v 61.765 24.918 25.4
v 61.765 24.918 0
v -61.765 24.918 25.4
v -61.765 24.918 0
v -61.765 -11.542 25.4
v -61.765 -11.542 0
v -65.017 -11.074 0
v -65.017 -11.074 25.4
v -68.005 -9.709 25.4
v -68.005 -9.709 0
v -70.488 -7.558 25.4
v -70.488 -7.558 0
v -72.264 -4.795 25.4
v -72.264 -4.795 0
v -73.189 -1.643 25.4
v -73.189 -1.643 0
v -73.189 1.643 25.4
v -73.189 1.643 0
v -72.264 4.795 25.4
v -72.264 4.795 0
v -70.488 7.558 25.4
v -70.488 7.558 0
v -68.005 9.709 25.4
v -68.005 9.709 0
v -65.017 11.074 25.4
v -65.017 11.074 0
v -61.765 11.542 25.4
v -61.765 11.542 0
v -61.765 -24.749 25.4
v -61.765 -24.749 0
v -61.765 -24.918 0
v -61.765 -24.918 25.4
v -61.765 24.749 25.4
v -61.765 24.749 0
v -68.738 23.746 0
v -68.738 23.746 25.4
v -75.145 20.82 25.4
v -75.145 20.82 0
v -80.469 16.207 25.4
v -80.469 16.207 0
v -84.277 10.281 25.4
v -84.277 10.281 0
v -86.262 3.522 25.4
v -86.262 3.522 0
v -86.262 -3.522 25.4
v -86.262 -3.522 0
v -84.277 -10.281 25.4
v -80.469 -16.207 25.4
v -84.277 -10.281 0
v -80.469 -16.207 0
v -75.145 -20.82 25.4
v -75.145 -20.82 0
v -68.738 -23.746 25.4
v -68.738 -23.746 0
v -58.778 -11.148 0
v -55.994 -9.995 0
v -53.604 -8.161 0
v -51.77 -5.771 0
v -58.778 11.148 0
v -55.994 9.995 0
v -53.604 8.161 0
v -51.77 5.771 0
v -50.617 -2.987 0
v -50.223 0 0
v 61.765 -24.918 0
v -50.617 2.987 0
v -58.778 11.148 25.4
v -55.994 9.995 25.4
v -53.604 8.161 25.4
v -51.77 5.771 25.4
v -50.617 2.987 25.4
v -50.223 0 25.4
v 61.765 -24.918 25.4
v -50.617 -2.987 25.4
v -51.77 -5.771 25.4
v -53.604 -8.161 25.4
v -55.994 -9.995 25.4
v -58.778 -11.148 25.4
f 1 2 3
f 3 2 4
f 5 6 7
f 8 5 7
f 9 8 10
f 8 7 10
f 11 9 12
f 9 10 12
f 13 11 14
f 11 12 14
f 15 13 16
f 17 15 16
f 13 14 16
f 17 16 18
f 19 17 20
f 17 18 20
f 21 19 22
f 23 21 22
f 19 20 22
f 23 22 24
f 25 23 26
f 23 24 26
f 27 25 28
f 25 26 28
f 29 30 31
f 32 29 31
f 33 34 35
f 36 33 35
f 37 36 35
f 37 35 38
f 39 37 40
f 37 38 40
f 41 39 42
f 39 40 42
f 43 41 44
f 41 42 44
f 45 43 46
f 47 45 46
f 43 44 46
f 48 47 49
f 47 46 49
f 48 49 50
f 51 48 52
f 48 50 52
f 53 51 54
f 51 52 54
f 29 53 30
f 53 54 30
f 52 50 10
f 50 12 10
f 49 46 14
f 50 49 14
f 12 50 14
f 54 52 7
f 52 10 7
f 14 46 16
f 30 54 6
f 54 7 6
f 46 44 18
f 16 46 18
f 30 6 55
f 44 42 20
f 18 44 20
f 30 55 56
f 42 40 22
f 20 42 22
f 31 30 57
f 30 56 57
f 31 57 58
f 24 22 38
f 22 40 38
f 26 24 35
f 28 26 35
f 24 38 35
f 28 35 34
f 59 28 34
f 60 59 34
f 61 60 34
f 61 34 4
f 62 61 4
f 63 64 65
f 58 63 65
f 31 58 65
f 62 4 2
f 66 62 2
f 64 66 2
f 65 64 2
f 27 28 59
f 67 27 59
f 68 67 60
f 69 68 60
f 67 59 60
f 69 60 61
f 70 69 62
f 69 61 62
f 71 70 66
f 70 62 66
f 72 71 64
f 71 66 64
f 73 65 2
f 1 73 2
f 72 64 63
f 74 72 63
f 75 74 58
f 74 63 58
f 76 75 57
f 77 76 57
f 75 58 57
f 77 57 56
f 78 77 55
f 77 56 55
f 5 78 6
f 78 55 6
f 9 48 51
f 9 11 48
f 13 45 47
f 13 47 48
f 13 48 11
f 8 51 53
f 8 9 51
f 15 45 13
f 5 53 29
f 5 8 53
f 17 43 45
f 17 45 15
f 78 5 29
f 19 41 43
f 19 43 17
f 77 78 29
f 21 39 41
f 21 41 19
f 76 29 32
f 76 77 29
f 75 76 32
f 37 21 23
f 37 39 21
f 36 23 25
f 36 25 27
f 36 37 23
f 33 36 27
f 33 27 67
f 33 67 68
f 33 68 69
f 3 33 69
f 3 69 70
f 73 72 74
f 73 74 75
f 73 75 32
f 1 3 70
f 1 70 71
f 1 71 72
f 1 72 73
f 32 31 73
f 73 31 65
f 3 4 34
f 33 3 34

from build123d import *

# Parameters (mm, degrees)
F1_DEPTH = 25.4


with BuildPart() as f1:
    # F0 (on Top) → F1 (new body)
    with BuildSketch(Plane.XY):
        with BuildLine():
            Line((-61.765037477, -24.7485272537), (-61.765037477, -24.9177198857))
            Line((-61.765037477, -24.9177198857), (61.765037477, -24.9177198857))
            Line((61.765037477, -24.9177198857), (61.765037477, 24.9177198857))
            Line((61.765037477, 24.9177198857), (-61.765037477, 24.9177198857))
            Line((-61.765037477, 24.9177198857), (-61.765037477, 24.7485272537))
            ThreePointArc((-61.765037477, 24.7485272537), (-44.2651860316, 17.4998514455), (-37.0165102233, 0))
            ThreePointArc((-37.0165102233, 0), (-44.2651860316, -17.4998514455), (-61.765037477, -24.7485272537))
        make_face()
        with BuildLine():
            ThreePointArc((-61.765037477, 24.7485272537), (-86.5135647307, 0), (-61.765037477, -24.7485272537))
            Line((-61.765037477, -24.7485272537), (-61.765037477, -11.5415442381))
            ThreePointArc((-61.765037477, -11.5415442381), (-73.3065817151, 0), (-61.765037477, 11.5415442381))
            Line((-61.765037477, 11.5415442381), (-61.765037477, 24.7485272537))
        make_face()
        with BuildLine():
            Line((-61.765037477, -11.5415442381), (-61.765037477, -24.7485272537))
            ThreePointArc((-61.765037477, -24.7485272537), (-44.2651860316, -17.4998514455), (-37.0165102233, 0))
            ThreePointArc((-37.0165102233, 0), (-44.2651860316, 17.4998514455), (-61.765037477, 24.7485272537))
            Line((-61.765037477, 24.7485272537), (-61.765037477, 11.5415442381))
            ThreePointArc((-61.765037477, 11.5415442381), (-53.6039332809, 8.1611041961), (-50.2234932389, 0))
            ThreePointArc((-50.2234932389, 0), (-53.6039332809, -8.1611041961), (-61.765037477, -11.5415442381))
        make_face()
    extrude(amount=F1_DEPTH)


solid = f1.part
